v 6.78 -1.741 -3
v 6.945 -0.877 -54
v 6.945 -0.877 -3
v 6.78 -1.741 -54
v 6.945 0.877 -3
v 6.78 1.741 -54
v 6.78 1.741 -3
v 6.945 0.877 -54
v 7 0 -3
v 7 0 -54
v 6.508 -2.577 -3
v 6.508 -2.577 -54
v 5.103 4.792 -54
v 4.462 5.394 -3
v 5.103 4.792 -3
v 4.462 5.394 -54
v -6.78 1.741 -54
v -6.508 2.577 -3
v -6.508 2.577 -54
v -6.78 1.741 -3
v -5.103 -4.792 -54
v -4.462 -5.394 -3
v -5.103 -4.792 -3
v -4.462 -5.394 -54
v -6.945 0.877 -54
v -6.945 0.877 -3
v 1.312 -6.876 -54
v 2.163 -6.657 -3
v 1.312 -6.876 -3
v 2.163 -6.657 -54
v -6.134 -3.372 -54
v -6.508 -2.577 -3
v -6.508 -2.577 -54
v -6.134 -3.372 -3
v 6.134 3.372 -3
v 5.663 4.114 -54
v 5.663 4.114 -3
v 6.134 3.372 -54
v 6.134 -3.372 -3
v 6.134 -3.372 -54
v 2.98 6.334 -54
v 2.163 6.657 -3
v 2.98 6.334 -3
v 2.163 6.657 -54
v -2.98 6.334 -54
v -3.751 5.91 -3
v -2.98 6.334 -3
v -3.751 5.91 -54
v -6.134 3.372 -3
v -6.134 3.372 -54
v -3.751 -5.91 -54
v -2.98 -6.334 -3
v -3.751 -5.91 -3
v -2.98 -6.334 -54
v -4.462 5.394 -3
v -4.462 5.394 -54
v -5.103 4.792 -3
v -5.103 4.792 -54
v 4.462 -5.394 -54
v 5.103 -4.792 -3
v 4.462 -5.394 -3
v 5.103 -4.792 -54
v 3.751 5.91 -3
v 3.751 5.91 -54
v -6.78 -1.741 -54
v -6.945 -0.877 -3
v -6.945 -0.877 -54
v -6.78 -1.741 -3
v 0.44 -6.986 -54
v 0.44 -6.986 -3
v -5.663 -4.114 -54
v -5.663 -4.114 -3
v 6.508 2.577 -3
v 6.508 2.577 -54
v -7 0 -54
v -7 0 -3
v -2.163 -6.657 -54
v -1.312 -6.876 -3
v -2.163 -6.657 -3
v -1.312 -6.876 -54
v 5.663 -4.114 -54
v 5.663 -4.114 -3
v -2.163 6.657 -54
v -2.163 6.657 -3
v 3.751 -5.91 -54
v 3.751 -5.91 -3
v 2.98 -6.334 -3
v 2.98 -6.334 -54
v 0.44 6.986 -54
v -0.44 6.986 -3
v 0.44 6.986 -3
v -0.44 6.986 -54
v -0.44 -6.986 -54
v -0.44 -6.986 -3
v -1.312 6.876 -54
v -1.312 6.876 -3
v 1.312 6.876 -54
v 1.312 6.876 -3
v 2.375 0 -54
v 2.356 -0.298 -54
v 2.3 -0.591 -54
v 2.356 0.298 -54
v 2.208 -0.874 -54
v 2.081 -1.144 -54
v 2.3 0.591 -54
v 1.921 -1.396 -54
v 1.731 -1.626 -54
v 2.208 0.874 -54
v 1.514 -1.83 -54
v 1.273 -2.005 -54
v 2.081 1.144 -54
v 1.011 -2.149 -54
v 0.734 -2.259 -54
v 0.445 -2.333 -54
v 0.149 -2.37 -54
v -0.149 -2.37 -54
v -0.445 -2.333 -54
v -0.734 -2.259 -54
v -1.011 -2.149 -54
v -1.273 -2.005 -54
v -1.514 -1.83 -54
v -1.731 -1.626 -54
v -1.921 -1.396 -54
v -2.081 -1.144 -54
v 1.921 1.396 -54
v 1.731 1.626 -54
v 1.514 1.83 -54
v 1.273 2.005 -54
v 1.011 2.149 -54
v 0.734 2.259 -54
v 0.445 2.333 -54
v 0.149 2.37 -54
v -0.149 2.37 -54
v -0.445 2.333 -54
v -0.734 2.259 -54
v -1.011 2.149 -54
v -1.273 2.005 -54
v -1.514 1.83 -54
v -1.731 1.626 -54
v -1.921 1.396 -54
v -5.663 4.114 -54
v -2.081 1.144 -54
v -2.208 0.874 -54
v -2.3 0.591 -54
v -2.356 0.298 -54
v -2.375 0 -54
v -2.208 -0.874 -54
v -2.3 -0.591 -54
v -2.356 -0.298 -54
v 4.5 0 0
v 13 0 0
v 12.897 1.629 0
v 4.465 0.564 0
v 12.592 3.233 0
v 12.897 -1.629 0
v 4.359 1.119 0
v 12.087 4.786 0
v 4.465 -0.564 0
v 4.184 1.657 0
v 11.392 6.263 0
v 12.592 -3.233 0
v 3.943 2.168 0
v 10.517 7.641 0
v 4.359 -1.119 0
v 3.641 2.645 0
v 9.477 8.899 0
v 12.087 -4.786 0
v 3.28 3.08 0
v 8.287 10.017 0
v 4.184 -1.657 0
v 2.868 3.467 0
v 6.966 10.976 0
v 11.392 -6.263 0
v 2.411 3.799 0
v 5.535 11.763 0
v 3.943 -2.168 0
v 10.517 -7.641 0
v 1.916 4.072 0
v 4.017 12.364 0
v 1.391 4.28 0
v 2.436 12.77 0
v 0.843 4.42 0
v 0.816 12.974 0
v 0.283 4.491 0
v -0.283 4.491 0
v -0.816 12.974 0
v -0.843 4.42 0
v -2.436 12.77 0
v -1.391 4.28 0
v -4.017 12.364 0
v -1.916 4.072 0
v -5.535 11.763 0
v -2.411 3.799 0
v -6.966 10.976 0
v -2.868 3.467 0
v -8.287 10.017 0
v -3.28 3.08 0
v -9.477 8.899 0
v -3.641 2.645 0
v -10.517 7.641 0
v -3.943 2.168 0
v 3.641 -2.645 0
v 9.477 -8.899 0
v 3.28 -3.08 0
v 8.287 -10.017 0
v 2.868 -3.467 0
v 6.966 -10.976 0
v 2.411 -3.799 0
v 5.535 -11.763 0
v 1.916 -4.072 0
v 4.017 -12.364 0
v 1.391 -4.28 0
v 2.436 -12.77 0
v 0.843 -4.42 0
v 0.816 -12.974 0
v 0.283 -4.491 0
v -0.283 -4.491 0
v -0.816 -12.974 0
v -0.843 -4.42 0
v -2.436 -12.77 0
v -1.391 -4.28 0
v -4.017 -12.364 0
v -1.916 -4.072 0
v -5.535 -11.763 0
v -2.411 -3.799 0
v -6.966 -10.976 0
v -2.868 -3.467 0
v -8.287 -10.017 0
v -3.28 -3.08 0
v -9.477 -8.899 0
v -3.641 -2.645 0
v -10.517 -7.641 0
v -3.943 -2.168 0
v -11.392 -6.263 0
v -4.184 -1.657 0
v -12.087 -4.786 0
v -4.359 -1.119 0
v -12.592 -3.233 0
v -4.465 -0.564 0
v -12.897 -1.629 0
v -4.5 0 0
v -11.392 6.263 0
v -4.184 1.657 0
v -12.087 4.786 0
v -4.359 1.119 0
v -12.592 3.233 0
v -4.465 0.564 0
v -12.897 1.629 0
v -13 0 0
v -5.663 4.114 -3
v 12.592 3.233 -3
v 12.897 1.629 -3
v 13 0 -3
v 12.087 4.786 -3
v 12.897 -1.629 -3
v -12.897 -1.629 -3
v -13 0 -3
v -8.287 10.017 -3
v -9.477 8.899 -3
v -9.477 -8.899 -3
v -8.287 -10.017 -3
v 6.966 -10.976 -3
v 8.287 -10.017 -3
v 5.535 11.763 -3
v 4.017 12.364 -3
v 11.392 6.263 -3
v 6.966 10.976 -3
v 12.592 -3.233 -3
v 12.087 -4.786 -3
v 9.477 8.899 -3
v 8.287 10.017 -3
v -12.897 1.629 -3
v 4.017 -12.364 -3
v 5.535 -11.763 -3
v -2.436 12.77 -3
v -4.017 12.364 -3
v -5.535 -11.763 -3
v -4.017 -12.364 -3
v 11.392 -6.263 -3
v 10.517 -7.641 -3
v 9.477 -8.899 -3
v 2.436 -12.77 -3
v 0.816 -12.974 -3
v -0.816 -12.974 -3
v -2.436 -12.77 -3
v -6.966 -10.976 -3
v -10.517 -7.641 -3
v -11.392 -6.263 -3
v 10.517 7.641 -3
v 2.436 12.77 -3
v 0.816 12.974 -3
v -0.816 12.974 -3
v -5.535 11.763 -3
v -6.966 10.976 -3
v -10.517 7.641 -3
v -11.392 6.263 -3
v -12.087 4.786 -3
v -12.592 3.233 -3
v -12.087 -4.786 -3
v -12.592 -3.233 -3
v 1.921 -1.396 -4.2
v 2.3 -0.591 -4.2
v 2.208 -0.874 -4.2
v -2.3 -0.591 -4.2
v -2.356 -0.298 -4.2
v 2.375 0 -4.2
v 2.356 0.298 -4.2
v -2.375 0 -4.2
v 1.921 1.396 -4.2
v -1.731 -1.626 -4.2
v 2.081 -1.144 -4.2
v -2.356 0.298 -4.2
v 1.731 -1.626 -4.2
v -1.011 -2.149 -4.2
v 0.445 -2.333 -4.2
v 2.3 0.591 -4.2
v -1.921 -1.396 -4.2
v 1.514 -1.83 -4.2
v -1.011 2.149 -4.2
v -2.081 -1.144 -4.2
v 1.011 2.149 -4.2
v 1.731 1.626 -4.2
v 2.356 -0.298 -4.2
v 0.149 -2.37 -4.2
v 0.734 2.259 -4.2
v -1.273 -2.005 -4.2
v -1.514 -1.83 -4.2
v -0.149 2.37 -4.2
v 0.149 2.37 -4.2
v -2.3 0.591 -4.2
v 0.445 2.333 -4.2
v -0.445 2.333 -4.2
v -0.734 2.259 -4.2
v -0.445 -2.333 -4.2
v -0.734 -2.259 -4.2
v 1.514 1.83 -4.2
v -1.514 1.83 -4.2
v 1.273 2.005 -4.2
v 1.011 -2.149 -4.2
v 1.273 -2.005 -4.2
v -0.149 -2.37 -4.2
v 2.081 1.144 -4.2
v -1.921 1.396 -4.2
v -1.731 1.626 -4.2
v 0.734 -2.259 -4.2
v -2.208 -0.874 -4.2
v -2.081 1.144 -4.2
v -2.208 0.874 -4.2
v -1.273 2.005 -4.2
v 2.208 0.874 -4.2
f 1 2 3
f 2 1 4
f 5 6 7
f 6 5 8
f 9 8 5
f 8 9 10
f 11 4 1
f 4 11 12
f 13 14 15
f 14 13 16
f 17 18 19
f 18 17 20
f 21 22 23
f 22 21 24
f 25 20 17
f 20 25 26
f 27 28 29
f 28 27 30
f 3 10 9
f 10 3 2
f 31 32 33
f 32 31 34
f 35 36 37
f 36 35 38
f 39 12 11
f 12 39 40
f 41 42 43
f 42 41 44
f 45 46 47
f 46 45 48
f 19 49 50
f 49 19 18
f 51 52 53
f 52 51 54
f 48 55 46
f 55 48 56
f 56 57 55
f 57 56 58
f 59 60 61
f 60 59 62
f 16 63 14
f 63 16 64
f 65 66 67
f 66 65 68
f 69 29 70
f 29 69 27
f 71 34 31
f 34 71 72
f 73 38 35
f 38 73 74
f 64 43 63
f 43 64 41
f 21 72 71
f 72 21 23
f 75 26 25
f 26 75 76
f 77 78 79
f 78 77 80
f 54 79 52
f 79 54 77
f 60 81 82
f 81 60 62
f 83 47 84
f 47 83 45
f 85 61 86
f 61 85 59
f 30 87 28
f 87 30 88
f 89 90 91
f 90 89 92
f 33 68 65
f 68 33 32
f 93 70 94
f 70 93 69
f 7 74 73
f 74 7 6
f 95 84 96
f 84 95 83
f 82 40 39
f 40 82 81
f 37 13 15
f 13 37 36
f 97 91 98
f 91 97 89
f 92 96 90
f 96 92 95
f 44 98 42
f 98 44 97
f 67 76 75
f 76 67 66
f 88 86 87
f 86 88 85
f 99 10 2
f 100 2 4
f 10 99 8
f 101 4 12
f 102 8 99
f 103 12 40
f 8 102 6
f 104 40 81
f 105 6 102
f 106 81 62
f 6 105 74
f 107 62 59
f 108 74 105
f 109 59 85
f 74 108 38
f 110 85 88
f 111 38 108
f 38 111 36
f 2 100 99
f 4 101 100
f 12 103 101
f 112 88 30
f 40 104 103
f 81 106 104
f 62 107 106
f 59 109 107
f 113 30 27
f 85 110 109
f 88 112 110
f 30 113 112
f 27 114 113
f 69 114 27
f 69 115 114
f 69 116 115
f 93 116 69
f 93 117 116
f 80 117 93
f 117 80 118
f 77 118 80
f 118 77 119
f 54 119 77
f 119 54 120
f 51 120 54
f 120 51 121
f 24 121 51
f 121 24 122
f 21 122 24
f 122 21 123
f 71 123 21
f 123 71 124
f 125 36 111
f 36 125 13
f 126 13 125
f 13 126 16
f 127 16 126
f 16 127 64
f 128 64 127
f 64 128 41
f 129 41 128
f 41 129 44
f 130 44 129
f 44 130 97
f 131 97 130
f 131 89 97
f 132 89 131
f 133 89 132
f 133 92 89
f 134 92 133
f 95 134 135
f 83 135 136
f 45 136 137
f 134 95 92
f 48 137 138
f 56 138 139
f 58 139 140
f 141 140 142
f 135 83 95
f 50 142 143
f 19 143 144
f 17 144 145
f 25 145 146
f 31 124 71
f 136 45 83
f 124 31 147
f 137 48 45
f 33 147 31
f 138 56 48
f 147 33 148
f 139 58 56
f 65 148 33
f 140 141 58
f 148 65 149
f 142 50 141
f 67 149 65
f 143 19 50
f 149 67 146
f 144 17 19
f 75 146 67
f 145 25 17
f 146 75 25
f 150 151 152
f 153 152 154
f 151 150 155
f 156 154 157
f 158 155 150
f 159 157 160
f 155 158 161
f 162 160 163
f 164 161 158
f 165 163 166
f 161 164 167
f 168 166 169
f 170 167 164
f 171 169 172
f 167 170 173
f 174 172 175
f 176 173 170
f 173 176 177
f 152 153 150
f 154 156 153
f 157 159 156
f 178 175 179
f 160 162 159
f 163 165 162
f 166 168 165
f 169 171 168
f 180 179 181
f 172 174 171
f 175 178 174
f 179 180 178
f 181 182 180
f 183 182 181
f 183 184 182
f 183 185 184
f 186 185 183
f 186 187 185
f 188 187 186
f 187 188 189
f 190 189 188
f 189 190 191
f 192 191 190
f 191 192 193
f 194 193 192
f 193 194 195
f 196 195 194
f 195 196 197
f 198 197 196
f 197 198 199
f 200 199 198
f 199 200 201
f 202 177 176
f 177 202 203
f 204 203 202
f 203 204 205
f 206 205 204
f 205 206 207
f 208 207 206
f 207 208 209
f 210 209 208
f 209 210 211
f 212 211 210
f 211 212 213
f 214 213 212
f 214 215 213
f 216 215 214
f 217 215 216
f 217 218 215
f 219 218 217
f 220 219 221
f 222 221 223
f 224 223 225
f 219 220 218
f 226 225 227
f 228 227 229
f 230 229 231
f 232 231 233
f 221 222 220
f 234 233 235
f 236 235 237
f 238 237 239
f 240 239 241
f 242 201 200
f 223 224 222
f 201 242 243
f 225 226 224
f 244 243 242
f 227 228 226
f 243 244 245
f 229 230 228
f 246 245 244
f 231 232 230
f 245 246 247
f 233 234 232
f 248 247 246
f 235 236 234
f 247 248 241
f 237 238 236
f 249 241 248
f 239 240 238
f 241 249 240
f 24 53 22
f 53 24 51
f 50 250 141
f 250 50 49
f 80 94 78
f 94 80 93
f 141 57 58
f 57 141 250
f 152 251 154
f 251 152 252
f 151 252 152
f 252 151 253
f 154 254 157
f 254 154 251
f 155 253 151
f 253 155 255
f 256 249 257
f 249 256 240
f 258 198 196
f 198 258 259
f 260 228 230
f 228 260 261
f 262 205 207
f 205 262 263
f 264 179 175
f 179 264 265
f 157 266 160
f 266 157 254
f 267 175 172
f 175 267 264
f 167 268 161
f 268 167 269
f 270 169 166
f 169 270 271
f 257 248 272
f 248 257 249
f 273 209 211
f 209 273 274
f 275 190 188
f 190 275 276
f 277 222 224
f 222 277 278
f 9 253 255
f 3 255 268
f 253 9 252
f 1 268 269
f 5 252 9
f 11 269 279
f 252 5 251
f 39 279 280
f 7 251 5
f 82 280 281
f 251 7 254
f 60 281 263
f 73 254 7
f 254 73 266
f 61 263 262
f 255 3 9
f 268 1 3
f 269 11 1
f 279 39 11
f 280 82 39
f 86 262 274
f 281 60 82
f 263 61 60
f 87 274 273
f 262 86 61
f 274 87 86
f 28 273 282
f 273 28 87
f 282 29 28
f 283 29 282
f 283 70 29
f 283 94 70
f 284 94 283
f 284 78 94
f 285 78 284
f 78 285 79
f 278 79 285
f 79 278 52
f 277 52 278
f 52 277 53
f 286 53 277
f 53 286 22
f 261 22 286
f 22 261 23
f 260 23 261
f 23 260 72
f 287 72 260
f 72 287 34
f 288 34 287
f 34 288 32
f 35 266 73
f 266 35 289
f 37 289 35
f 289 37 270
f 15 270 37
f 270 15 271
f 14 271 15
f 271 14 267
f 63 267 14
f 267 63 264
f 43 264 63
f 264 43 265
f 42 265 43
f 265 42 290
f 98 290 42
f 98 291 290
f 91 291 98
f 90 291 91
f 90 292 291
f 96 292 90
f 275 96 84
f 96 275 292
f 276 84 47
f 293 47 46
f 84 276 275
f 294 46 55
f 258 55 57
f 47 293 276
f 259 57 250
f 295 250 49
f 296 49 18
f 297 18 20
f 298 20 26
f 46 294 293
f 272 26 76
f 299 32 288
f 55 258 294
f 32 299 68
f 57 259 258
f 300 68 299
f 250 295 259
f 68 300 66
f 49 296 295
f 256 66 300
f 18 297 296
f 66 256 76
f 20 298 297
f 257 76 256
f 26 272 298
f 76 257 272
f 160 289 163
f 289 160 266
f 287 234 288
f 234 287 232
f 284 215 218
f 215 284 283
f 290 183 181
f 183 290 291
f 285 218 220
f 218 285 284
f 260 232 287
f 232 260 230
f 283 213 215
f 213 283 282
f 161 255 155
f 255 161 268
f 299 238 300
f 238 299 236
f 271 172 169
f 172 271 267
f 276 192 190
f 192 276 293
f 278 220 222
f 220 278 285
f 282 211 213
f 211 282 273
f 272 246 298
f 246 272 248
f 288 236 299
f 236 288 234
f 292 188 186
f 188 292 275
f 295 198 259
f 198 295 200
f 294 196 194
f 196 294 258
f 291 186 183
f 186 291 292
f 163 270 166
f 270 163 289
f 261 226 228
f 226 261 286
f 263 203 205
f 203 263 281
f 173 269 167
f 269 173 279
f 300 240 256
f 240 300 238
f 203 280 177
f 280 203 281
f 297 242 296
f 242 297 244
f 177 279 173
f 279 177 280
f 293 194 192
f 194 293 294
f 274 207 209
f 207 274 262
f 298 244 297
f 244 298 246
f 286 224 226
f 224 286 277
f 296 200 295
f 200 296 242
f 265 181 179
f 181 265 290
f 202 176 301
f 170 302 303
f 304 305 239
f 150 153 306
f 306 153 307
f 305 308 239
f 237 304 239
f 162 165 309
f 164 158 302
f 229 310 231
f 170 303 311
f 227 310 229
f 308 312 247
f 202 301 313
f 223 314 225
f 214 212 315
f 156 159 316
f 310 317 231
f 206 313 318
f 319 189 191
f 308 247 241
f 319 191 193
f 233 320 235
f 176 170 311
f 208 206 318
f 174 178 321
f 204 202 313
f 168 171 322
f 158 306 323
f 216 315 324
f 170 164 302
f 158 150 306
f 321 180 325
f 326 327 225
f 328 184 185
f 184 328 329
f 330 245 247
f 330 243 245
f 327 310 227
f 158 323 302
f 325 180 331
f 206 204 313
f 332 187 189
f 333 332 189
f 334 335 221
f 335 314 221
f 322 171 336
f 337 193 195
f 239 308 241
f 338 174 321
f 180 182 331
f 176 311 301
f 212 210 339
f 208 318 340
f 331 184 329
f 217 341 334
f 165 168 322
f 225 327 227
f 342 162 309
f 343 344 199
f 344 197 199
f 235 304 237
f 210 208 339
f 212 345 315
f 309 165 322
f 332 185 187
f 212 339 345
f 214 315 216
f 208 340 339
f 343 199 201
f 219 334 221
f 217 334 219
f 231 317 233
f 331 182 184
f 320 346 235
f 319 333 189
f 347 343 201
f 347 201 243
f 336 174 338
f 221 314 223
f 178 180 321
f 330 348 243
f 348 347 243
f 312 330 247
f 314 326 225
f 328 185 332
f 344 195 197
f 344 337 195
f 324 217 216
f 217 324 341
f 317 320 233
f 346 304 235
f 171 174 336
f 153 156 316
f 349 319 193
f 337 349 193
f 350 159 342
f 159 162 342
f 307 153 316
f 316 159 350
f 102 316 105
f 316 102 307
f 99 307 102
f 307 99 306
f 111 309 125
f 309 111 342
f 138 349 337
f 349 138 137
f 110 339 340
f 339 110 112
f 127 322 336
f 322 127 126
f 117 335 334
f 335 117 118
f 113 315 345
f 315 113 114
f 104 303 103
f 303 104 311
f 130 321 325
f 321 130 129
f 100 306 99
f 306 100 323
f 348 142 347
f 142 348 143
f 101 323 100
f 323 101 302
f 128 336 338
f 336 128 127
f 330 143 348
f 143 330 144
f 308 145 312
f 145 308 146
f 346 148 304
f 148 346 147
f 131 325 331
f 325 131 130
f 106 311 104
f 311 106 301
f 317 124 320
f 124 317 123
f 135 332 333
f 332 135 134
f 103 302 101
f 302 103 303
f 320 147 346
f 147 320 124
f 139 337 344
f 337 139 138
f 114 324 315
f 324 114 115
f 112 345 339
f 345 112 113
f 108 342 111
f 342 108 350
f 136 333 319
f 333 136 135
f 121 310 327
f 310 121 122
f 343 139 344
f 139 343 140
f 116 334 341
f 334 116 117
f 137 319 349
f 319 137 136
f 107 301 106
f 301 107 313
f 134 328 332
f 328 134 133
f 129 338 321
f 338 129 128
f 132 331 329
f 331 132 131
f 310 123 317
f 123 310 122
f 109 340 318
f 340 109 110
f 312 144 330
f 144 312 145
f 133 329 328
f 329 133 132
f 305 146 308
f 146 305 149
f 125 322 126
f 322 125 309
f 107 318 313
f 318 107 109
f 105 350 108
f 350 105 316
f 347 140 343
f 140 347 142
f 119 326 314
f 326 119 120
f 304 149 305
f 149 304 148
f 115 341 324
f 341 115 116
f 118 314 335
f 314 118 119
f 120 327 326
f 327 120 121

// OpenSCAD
$fn = 50;


difference() {
	union() {
		translate(v = [0, 0, -54.0000000000]) {
			cylinder(h = 54, r = 7.0000000000);
		}
		translate(v = [0, 0, -3.0000000000]) {
			cylinder(h = 3, r = 13.0000000000);
		}
	}
	union() {
		translate(v = [0, 0, 0]) {
			rotate(a = [0, 0, 0]) {
				difference() {
					union() {
						#translate(v = [0, 0, -54.0000000000]) {
							cylinder(h = 54, r = 2.2500000000);
						}
						#translate(v = [0, 0, -4.2000000000]) {
							cylinder(h = 4.2000000000, r = 7.0000000000, r1 = 2.3750000000, r2 = 4.5000000000);
						}
						#translate(v = [0, 0, -54.0000000000]) {
							cylinder(h = 54, r = 2.3750000000);
						}
						#translate(v = [0, 0, -54.0000000000]) {
							cylinder(h = 54, r = 2.2500000000);
						}
					}
					union();
				}
			}
		}
	}
}
